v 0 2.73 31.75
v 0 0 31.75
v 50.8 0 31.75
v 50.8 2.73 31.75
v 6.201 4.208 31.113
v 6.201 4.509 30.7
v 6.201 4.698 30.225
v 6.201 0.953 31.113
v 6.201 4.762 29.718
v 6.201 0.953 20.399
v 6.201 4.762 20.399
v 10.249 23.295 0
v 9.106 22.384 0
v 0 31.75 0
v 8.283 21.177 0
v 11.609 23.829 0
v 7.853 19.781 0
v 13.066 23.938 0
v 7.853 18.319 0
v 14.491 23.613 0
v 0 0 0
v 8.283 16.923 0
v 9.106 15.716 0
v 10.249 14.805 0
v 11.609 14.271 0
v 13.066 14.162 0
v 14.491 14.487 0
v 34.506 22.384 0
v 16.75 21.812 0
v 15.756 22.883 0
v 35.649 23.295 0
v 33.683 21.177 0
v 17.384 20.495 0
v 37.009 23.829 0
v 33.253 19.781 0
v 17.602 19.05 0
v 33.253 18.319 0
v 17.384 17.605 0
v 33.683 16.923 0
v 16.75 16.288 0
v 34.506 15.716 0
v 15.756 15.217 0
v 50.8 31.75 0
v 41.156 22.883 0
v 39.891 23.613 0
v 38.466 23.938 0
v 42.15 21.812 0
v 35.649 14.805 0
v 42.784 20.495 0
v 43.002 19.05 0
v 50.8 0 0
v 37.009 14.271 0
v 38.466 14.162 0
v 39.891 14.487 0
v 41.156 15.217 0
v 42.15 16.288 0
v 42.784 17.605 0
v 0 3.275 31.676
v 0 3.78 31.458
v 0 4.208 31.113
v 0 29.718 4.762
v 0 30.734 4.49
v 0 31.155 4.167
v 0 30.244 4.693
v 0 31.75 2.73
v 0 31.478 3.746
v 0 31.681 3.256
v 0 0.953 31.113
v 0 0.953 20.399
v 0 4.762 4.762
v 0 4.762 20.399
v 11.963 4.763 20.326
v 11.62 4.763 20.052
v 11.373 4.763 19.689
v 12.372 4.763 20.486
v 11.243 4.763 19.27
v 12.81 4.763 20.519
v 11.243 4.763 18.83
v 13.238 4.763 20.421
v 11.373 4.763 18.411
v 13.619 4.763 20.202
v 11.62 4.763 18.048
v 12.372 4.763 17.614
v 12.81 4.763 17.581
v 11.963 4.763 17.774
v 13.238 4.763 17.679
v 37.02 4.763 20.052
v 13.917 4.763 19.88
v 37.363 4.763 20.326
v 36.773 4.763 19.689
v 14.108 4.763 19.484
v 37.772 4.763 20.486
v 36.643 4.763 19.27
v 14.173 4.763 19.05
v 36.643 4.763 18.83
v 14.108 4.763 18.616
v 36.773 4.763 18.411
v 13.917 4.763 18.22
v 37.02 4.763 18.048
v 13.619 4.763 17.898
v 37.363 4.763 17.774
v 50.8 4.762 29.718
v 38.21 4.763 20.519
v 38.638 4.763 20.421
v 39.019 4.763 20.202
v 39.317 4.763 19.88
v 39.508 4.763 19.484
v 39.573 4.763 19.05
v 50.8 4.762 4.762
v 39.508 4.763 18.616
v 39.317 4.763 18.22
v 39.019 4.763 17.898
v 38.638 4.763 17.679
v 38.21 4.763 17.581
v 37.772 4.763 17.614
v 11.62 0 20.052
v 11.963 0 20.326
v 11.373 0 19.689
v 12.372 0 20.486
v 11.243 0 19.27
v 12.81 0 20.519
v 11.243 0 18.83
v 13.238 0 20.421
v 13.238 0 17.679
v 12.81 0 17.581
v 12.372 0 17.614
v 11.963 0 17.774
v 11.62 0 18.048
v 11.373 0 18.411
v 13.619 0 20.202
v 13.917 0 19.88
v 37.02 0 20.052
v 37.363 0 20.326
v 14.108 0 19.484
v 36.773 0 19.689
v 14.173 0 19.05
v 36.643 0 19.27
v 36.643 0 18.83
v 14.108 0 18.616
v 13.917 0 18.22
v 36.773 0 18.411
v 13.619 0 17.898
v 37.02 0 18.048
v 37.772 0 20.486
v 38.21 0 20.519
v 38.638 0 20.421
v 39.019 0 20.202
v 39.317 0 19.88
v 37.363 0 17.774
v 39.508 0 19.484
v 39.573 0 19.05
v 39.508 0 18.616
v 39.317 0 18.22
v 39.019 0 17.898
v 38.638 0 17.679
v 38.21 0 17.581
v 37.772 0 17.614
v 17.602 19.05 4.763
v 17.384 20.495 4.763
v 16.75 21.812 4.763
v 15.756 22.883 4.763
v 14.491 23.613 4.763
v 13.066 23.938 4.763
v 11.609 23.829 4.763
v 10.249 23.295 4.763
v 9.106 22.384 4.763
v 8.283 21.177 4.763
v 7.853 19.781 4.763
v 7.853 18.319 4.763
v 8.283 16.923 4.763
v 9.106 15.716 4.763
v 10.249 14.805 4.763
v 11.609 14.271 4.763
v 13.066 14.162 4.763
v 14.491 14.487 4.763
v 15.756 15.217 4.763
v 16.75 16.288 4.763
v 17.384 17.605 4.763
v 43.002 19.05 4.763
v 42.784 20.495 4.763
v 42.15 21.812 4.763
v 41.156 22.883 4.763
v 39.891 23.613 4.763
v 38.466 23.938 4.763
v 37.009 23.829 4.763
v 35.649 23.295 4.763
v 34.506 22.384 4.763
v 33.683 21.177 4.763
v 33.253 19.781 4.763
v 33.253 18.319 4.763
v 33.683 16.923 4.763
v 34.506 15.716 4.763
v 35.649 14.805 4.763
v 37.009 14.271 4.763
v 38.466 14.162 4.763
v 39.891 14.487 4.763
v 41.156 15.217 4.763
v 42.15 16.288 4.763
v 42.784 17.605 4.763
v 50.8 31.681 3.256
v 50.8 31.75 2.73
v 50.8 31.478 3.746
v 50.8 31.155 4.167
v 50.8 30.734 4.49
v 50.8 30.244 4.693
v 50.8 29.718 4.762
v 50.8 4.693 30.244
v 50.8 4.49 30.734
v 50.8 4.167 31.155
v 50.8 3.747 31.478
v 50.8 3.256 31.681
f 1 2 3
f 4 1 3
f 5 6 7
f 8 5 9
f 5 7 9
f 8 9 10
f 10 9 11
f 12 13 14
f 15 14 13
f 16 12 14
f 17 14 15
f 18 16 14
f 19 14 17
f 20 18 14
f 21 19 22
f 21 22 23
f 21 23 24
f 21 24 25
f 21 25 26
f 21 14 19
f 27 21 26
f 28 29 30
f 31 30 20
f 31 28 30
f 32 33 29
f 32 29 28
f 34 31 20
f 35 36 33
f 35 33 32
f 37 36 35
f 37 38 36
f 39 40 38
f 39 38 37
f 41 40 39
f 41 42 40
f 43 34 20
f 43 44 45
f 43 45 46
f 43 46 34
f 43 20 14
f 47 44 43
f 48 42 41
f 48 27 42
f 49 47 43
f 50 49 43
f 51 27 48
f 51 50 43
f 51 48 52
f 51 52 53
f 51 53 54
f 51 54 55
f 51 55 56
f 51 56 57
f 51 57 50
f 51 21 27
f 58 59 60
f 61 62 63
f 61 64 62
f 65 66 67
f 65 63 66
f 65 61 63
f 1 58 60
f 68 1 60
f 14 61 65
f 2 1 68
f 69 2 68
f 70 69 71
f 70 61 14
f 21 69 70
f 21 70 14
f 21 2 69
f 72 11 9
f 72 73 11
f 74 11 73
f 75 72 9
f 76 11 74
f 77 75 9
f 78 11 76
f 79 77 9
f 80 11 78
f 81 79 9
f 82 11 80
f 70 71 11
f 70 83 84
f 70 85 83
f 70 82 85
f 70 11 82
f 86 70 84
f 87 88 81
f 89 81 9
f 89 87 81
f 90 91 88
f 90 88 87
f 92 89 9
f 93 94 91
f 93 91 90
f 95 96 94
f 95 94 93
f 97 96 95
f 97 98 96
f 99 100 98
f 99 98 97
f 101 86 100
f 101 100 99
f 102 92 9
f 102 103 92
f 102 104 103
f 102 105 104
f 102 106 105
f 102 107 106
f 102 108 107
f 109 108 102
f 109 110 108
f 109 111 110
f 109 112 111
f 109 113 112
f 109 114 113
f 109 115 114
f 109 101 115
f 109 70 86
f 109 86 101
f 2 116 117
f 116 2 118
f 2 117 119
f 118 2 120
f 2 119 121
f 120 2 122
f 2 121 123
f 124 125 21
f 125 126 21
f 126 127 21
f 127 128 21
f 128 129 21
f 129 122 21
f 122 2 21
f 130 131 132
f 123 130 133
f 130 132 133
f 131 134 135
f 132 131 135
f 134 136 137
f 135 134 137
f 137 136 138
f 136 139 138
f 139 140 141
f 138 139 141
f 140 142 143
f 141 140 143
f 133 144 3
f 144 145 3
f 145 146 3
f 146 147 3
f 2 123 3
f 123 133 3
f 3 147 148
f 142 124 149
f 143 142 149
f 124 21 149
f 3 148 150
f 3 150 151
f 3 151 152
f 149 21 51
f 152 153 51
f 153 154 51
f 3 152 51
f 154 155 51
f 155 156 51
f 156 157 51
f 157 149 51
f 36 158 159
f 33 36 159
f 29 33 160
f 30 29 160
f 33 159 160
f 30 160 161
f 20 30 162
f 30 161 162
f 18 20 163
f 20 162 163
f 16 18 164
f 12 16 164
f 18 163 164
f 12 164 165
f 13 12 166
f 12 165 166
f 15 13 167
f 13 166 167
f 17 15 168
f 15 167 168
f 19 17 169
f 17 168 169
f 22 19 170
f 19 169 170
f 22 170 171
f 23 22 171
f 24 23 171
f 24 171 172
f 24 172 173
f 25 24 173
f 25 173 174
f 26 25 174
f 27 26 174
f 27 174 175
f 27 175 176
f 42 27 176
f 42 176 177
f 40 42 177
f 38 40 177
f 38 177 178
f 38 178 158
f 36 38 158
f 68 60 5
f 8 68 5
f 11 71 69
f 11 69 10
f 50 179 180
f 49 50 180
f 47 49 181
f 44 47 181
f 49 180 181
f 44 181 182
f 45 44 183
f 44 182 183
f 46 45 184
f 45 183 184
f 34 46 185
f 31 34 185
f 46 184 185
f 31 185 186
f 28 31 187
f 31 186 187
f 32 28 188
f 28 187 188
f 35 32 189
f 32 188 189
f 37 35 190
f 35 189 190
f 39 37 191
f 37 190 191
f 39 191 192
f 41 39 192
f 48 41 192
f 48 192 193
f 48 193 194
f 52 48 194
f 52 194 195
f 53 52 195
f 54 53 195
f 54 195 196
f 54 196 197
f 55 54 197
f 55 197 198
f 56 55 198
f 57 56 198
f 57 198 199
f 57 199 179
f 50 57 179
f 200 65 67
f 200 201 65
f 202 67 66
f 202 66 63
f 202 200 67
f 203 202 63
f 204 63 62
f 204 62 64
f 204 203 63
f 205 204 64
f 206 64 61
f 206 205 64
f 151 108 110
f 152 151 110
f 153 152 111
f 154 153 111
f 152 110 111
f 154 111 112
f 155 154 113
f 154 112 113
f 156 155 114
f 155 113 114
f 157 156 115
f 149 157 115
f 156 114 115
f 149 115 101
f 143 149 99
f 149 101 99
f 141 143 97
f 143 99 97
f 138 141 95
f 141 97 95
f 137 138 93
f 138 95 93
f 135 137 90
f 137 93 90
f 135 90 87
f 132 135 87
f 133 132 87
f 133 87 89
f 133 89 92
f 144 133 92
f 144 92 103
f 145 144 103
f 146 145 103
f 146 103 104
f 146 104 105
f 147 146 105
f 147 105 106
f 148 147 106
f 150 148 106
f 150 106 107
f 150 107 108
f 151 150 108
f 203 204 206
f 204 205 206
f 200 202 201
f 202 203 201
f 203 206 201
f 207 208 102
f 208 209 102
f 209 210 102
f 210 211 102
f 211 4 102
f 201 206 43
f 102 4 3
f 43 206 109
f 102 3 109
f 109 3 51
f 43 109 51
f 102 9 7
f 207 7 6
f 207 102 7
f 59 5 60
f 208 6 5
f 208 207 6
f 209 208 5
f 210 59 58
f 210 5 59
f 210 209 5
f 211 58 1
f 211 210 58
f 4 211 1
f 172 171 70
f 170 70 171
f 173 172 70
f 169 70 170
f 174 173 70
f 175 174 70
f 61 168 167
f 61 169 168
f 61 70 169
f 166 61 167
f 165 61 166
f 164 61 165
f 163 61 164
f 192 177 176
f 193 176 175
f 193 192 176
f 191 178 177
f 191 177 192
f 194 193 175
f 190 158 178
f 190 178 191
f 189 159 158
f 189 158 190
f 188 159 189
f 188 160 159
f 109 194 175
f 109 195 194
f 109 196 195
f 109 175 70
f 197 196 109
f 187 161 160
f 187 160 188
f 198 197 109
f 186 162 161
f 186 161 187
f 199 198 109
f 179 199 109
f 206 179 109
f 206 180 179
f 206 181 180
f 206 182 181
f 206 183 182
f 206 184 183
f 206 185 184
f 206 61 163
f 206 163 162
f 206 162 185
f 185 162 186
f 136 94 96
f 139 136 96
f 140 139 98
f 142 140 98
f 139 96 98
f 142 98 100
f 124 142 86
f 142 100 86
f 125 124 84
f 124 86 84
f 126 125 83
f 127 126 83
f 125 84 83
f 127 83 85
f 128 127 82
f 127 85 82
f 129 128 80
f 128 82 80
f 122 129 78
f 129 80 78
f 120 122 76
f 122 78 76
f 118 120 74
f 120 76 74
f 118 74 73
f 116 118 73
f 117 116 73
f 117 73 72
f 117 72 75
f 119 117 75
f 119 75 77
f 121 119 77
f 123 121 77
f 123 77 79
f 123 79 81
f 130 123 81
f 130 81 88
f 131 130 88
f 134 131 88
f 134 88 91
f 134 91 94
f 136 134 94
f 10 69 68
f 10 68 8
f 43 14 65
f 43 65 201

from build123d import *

# Parameters (mm, degrees)
SKETCH1_W                   = 50.8
SKETCH1_H                   = 31.75
BASE_LEG_DEPTH              = 4.7625
SKETCH2_W                   = 50.8
SKETCH2_H                   = 31.75
PERPENDICULAR_LEG_DEPTH     = 4.7625
FILLET1_R                   = 2.032
F_32_0_116_DIAMETER_HOLE1_D = 2.9464
W_0_386_DIAMETER_HOLE1_D    = 9.8044
SKETCH15_W                  = 6.549717957
SKETCH15_H                  = 10.713777056
CUT_EXTRUDE2_DEPTH          = 3.81


with BuildPart() as part:
    # Sketch1 → Base leg (new body)
    with BuildSketch(Plane(origin=(0, 0, 0), x_dir=(1, 0, 0), z_dir=(0, 1, 0))):
        with Locations((25.4, -15.875)):
            Rectangle(SKETCH1_W, SKETCH1_H)
    extrude(amount=BASE_LEG_DEPTH)

    # Sketch2 → Perpendicular leg (add)
    with BuildSketch(Plane.XY):
        with Locations((25.4, 15.875)):
            Rectangle(SKETCH2_W, SKETCH2_H)
    extrude(amount=PERPENDICULAR_LEG_DEPTH)

    # Fillet1
    fillet1_edges = [part.edges().sort_by_distance(p)[0] for p in [
        (25.4, 31.75, 4.7625),
        (25.4, 4.7625, 31.75),
    ]]
    fillet(fillet1_edges, radius=FILLET1_R)

    # #32 (0.116) Diameter Hole1 (through all)
    with Locations(Plane(origin=(0, 0, 0), x_dir=(-1, 0, 0), z_dir=(0, -1, 0))):
        with Locations((-38.1, -19.05), (-12.7, -19.05)):
            Hole(F_32_0_116_DIAMETER_HOLE1_D / 2)

    # W (0.386) Diameter Hole1 (through all)
    with Locations(Plane(origin=(0, 0, 0), x_dir=(-1, 0, 0), z_dir=(0, 0, -1))):
        with Locations((-12.7, 19.05), (-38.1, 19.05)):
            Hole(W_0_386_DIAMETER_HOLE1_D / 2)

    # Sketch15 → Cut-Extrude2 (cut)
    with BuildSketch(Plane(origin=(0, 4.7625, 0), x_dir=(1, 0, 0), z_dir=(0, 1, 0))):
        with Locations((2.926349869, -25.756092966)):
            Rectangle(SKETCH15_W, SKETCH15_H)
    extrude(amount=-CUT_EXTRUDE2_DEPTH, mode=Mode.SUBTRACT)


solid = part.part
